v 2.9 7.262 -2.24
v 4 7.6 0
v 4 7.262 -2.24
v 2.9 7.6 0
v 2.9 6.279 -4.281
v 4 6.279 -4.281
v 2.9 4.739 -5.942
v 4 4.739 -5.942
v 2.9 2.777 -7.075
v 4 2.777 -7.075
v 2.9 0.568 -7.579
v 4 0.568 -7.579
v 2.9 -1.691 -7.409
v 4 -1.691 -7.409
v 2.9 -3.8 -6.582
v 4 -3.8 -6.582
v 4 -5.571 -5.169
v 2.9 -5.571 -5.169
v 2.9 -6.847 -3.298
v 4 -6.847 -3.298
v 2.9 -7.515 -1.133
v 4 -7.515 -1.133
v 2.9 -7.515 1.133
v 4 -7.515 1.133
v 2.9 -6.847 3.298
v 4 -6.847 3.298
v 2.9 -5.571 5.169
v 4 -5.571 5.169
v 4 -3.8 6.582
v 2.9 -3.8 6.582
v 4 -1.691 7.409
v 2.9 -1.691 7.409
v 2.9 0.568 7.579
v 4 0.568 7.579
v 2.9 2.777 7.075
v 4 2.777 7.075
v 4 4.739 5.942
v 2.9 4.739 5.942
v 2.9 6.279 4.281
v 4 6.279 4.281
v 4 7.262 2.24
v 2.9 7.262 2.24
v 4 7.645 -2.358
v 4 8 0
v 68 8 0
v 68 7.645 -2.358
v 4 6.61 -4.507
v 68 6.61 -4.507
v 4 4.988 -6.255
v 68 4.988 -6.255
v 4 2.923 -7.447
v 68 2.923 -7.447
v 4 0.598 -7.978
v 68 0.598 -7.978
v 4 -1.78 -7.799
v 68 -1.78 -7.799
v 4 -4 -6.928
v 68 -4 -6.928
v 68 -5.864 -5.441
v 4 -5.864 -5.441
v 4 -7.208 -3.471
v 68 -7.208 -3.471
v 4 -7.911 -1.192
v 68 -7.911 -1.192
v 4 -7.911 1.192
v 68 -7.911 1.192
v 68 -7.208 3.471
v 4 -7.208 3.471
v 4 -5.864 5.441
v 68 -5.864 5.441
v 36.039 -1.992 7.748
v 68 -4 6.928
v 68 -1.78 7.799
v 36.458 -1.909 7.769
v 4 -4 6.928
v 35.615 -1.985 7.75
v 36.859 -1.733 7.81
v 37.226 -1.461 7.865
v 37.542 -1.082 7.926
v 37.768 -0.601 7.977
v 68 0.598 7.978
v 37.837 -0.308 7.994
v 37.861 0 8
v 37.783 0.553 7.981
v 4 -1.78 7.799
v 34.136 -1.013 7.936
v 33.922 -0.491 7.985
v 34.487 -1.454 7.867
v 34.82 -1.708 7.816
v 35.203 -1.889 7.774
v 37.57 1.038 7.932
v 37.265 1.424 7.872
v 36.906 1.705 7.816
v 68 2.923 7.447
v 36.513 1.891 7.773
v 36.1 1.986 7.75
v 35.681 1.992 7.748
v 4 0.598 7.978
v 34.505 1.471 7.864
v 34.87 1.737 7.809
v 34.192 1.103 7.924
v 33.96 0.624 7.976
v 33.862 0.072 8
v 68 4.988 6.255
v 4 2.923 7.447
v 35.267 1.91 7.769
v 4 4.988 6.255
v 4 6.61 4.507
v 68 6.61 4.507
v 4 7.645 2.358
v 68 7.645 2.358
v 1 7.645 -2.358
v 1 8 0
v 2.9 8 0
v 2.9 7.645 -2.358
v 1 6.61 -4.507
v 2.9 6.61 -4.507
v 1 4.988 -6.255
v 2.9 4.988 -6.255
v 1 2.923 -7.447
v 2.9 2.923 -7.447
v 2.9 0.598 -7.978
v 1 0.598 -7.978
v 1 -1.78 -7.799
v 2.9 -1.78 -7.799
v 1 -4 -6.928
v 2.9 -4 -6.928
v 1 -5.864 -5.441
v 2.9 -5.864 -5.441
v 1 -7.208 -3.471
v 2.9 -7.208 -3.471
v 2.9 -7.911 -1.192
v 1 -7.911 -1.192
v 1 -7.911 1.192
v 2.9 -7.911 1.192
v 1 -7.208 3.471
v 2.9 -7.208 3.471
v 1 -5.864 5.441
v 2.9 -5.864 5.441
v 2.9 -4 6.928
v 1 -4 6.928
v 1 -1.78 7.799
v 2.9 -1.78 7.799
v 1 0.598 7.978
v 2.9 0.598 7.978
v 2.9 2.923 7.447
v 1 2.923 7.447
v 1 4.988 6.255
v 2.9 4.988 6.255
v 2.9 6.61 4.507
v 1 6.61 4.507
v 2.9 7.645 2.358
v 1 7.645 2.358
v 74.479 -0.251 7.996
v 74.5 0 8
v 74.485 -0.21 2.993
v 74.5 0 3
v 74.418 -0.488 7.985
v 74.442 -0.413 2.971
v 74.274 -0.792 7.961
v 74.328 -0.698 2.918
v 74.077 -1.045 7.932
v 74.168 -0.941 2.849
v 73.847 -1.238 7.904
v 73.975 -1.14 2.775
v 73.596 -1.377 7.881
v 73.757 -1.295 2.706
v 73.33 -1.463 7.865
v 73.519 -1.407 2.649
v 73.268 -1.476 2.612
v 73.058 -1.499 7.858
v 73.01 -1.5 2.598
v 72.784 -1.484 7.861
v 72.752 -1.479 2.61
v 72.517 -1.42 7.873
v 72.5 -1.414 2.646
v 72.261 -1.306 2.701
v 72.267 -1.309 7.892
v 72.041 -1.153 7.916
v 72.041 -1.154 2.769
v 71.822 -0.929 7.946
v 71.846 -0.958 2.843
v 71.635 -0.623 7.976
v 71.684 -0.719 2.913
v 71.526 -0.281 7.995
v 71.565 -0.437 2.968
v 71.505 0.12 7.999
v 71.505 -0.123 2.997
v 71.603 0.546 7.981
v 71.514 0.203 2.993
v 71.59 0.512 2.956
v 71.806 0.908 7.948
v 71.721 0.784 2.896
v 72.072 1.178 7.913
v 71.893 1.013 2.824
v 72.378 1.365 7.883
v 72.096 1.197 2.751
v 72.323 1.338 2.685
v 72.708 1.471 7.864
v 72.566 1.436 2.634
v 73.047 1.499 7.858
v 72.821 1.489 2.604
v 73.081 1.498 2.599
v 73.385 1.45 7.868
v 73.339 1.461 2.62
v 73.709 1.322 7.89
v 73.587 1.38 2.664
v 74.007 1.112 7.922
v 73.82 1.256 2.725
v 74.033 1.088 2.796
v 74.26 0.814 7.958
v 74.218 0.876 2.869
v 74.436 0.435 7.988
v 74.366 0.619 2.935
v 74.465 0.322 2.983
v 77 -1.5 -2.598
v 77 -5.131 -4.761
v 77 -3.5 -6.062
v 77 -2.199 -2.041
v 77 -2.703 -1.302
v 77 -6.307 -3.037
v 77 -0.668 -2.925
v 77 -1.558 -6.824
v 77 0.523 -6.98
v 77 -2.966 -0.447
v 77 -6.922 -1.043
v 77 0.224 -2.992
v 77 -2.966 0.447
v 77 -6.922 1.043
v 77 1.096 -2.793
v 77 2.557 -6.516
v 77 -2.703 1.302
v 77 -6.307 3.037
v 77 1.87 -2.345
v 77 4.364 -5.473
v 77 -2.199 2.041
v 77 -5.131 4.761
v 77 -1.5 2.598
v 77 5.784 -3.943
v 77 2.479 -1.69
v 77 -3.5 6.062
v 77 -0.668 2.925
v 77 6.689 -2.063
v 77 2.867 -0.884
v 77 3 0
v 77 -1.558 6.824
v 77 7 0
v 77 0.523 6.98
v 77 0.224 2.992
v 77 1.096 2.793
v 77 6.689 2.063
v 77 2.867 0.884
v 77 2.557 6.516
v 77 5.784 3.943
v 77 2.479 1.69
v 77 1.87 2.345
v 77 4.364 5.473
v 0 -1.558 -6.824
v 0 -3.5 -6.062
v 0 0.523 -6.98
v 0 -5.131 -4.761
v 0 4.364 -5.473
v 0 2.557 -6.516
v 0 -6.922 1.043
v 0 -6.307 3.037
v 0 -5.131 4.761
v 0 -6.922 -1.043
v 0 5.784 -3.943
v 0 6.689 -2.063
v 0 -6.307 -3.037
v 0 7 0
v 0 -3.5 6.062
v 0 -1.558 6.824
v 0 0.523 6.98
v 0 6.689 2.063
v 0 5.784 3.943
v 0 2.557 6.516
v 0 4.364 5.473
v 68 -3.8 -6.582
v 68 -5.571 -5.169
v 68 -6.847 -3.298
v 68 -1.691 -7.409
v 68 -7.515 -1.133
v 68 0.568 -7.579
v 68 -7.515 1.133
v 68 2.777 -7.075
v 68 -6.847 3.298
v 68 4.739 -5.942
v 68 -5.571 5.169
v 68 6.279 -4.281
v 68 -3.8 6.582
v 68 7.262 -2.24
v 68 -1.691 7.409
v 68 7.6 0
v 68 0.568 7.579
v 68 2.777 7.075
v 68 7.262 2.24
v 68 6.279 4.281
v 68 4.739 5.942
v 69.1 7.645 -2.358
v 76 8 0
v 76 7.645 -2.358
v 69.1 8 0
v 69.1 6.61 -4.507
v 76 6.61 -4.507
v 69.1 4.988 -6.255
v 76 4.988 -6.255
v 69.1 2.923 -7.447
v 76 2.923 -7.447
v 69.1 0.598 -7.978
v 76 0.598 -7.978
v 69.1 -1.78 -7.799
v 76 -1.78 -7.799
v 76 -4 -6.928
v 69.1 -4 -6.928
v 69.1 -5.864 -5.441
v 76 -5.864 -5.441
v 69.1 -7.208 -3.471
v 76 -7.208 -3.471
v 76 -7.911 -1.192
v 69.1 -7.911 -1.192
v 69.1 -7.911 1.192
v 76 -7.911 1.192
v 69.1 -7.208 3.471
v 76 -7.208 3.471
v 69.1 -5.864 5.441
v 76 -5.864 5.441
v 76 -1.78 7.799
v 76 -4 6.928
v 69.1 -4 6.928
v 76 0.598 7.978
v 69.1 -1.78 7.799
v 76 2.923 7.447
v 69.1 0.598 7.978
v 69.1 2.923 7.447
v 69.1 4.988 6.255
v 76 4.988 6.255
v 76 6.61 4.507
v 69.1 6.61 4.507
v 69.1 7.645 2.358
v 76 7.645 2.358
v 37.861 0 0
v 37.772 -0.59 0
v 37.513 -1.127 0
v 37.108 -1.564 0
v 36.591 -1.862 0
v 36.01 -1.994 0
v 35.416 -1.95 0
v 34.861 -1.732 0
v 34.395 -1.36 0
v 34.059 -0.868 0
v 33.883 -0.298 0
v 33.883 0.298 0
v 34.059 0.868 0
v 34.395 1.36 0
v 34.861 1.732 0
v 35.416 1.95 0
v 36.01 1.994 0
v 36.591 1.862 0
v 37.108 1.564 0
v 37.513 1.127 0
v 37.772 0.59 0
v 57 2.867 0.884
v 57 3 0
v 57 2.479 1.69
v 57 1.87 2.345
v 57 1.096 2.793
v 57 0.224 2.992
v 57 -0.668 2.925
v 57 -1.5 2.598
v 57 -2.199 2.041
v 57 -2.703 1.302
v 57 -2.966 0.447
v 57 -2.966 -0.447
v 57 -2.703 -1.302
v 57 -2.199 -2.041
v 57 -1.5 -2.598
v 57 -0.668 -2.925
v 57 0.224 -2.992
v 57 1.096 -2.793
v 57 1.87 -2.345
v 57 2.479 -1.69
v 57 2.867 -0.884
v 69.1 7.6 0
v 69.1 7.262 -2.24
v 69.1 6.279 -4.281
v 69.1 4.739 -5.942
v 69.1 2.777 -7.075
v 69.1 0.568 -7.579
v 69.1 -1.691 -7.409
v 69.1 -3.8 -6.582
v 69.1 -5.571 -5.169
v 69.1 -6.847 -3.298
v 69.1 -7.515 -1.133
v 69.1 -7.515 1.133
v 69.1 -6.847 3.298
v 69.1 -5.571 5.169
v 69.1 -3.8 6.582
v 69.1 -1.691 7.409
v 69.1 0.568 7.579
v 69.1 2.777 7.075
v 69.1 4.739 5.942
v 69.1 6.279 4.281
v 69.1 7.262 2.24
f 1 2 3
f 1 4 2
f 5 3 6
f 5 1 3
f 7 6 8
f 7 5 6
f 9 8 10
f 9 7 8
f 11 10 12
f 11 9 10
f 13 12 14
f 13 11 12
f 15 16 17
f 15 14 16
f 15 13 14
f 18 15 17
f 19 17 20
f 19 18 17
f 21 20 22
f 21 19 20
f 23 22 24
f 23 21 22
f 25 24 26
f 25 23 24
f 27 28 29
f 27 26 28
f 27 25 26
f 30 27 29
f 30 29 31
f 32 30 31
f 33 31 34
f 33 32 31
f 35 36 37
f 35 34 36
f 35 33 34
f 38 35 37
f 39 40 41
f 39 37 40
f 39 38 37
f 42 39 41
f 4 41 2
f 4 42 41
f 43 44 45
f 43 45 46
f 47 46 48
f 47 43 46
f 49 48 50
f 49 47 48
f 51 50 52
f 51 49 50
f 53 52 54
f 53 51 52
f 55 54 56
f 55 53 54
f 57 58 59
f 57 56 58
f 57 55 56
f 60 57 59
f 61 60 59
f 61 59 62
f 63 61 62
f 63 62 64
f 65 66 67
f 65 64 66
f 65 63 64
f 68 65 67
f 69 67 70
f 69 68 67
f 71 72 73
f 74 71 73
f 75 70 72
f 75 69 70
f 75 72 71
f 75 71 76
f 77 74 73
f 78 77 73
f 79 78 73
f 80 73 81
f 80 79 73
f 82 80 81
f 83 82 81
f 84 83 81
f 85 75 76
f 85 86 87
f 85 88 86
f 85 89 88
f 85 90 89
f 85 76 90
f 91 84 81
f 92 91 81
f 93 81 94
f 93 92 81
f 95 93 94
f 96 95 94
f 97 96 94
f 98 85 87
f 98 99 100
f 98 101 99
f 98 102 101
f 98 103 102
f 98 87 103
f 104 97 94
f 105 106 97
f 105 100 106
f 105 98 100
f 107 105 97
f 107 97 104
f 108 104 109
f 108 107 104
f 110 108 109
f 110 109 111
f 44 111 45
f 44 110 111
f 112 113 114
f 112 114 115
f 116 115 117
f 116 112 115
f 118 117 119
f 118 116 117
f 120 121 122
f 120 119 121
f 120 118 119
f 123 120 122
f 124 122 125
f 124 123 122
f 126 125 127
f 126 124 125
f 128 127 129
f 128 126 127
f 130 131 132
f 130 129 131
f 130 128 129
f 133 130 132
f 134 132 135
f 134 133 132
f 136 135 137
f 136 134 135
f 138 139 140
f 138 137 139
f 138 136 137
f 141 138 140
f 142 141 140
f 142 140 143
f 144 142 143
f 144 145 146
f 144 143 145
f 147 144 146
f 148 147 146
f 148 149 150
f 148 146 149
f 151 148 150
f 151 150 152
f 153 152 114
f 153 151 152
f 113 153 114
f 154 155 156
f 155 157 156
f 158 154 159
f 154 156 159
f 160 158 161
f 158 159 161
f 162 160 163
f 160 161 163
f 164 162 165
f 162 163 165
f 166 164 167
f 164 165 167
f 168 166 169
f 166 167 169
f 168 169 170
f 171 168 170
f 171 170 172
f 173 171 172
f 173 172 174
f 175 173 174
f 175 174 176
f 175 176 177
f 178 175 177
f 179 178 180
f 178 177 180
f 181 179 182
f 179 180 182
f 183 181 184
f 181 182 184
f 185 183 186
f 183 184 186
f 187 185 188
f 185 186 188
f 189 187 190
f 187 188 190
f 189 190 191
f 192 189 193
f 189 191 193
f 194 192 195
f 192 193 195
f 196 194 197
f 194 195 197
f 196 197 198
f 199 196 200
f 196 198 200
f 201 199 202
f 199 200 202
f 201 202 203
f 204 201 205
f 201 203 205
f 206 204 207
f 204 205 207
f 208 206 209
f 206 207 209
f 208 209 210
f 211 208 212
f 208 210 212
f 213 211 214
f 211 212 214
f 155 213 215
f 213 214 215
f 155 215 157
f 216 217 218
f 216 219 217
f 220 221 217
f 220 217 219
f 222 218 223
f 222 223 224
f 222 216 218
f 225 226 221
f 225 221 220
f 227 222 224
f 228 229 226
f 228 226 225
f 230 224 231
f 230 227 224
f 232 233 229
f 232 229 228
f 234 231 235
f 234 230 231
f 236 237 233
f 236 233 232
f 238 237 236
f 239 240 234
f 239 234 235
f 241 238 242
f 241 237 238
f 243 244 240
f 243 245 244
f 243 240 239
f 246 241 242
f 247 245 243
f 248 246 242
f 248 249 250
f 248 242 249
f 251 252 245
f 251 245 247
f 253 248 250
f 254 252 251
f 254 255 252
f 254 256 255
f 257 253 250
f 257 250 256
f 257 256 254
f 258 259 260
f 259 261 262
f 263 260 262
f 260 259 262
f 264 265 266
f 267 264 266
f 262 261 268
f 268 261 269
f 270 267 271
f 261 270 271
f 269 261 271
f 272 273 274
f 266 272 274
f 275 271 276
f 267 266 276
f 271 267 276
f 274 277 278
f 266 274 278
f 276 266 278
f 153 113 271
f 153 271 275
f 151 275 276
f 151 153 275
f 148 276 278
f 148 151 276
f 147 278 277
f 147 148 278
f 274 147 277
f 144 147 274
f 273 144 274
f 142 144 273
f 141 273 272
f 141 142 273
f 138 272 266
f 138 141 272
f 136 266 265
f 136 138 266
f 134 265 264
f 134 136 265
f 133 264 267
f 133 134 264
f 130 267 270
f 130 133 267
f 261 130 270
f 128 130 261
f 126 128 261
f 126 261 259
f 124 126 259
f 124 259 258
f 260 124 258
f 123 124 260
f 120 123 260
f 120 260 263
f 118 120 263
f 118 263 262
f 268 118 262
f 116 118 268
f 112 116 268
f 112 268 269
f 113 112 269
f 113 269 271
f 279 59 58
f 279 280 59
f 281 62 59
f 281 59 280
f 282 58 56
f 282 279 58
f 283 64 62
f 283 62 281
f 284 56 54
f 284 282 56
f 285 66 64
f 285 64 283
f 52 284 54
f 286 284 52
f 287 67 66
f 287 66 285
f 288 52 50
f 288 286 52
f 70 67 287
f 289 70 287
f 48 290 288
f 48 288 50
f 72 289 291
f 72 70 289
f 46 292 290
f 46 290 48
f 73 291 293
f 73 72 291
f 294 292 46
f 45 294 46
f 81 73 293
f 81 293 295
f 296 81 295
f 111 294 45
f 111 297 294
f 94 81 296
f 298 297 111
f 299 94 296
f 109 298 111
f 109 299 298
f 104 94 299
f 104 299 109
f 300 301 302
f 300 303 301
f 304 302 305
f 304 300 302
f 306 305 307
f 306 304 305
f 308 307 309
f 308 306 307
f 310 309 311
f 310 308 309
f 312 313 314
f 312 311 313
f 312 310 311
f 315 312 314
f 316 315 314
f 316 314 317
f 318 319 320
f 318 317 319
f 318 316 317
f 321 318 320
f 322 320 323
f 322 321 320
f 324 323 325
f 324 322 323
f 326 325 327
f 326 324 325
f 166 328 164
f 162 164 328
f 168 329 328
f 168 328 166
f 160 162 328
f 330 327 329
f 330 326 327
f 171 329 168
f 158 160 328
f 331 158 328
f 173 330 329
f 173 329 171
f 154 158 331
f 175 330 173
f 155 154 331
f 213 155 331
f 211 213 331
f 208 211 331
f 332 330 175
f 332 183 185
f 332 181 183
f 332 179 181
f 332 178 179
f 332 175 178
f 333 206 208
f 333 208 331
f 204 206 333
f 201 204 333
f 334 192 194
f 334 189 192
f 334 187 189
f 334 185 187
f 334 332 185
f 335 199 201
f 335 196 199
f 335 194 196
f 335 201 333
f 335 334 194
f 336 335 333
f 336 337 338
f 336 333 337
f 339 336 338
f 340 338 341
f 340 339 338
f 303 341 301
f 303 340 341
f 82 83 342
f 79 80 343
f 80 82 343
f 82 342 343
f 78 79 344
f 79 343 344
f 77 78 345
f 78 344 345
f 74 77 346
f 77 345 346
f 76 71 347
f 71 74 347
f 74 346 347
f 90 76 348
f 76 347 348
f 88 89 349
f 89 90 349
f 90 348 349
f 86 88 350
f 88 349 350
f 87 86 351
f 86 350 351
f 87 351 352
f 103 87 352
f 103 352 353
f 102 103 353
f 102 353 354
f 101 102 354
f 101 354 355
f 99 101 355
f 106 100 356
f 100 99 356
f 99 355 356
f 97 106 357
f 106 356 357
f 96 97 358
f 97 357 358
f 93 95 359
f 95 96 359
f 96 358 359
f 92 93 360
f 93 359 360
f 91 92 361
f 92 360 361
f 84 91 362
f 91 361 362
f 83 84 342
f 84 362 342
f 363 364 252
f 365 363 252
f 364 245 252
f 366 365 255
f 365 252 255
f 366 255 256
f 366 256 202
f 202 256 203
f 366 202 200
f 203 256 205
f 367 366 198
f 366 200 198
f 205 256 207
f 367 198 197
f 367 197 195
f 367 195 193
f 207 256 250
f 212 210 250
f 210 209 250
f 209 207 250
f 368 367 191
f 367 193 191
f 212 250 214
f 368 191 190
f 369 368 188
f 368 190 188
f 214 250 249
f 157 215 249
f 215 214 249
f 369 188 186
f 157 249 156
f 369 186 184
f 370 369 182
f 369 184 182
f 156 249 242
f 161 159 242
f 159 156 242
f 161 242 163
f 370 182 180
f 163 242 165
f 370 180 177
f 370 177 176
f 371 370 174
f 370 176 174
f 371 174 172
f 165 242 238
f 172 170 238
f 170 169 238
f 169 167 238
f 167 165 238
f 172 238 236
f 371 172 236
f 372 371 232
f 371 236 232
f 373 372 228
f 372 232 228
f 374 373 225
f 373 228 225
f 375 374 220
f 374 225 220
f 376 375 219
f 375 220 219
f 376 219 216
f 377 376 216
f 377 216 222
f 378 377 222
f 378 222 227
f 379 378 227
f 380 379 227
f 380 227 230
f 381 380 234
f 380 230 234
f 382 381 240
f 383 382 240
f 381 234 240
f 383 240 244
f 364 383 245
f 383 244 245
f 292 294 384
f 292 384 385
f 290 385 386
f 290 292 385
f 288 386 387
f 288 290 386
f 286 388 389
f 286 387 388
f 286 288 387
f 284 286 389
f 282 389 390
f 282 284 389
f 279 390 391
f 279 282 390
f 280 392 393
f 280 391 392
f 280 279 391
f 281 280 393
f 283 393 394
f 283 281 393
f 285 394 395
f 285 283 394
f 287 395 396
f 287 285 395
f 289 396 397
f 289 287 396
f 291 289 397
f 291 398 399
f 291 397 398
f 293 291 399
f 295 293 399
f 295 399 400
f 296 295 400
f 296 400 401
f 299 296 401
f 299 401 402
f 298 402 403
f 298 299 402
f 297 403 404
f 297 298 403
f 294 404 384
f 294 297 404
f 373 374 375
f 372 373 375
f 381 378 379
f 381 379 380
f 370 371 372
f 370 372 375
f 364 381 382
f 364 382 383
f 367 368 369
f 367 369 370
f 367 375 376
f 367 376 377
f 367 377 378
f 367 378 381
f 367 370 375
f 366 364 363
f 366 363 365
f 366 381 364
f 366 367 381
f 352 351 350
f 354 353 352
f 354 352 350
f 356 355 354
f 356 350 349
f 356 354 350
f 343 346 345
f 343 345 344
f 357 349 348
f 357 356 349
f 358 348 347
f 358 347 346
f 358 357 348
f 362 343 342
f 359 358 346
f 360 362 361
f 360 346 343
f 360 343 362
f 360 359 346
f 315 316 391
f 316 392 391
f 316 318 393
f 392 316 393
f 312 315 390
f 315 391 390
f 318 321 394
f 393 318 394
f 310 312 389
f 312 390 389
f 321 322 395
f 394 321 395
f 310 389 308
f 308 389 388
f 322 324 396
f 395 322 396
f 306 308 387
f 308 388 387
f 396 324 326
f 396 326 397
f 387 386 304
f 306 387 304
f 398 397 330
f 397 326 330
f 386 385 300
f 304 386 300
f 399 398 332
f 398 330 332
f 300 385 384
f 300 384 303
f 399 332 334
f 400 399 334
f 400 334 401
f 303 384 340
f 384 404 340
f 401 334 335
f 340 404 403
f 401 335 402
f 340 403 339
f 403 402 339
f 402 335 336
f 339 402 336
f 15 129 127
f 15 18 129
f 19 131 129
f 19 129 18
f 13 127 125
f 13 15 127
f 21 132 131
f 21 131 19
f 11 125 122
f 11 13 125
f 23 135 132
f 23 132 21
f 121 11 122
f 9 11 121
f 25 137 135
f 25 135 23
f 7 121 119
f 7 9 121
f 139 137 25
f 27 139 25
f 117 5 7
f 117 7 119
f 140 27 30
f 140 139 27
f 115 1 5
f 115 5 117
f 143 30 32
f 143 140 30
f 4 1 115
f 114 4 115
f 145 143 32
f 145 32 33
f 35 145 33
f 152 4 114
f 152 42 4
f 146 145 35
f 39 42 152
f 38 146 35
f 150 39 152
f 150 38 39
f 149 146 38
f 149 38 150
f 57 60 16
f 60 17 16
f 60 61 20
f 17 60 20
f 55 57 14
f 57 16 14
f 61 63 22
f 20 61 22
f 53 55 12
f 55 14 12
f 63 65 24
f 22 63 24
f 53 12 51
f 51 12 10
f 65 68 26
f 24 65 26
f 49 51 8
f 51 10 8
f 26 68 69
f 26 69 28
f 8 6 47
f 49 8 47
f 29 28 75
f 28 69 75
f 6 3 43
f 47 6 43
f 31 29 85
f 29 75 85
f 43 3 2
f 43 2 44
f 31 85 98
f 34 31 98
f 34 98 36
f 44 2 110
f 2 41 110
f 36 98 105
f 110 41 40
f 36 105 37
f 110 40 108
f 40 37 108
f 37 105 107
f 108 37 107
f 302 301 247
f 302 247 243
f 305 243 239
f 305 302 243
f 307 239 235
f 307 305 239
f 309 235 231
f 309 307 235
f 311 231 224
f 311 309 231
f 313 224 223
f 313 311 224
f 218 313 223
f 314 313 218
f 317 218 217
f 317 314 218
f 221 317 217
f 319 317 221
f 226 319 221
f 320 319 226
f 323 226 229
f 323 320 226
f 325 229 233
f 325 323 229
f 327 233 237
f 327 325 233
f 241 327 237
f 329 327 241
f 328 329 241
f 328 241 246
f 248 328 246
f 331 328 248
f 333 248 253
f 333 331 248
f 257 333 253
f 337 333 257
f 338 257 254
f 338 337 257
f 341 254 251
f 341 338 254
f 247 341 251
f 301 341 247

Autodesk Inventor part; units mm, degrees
ref_plane "YZ Plane" through (0, 0, 0) normal (1, 0, 0) x (0, 1, 0)
ref_plane "XZ Plane" through (0, 0, 0) normal (0, 1, 0) x (-1, 0, 0)
ref_plane "XY Plane" through (0, 0, 0) normal (0, 0, 1) x (1, 0, 0)
sketch "Sketch1" plane through (0, 0, 0) normal (0, 0, 1) x (1, 0, 0)
  line L0 (0, 0) -> (77, 0)
  line L1 (77, 0) -> (77, 8)
  line L2 (77, 8) -> (0, 8)
  line L3 (0, 8) -> (0, 0)
  line L4 (68, 8) -> (69.1, 8)
  line L5 (69.1, 8) -> (69.1, 7.6)
  line L6 (69.1, 7.6) -> (68, 7.6)
  line L7 (68, 7.6) -> (68, 8)
  line L8 (38.5, 8) -> (38.5, 0)
  line L9 (77, 0) -> (57, 0)
  line L10 (57, 0) -> (57, 3)
  line L11 (57, 3) -> (77, 3)
  line L12 (77, 3) -> (77, 0)
  line L13 (2.9, 8) -> (4, 8)
  line L14 (4, 8) -> (4, 7.6)
  line L15 (4, 7.6) -> (2.9, 7.6)
  line L16 (2.9, 7.6) -> (2.9, 8)
  point P0 (68.55, 7.6)
  point P1 (69.1, 7.8)
  point P2 (57, 0)
  point P3 (77, 3)
  point P4 (69.1, 8)
  point P5 (4, 8)
  dimension "d0" = 77
  dimension "d1" = 8
  dimension "d2" = 1.1
  dimension "d3" = 7.6
  dimension "d4" = 7.9
  dimension "d5" = 20
  dimension "d6" = 3
  dimension "d8" = 1.1
  dimension "d9" = 7.6
  dimension "d10" = 2.9
revolve "Revolution1" add sketch "Sketch1" angle 360 about axis through (0, 0, 0) along (1, 0, 0) contours L3 L2 L16 L15 L14 L8 L0 | L8 L2 L7 L6 L5 L1 L11 L10 L0
sketch "Sketch2" plane through (0, 0, 0) normal (0, 0, 1) x (1, 0, 0)
  line L0 (77, -3) -> (77, 3) projected
  line L1 (57, -3) -> (57, 3) projected
  circle A0 centre (73, 0) radius 1.5
  circle A1 centre (35.8607, 0) radius 2
  point P0 (0, 0)
  dimension "d11" = 3
  dimension "d12" = 4
  dimension "d18" = 4
extrude "Extrusion1" cut sketch "Sketch2" along normal blind 10
chamfer "Chamfer1" distance 1 angle 45 2 edges at (0, -8, 0) (77, -8, 0)
thread "Thread1" size "M4x0.7" class "6H" standard "ANSI Metric M Profile" full length
thread "Thread2" size "M3x0.5" class "6H" standard "ANSI Metric M Profile" full length
properties part number "shaft potmeter" material "Stainless Steel"
